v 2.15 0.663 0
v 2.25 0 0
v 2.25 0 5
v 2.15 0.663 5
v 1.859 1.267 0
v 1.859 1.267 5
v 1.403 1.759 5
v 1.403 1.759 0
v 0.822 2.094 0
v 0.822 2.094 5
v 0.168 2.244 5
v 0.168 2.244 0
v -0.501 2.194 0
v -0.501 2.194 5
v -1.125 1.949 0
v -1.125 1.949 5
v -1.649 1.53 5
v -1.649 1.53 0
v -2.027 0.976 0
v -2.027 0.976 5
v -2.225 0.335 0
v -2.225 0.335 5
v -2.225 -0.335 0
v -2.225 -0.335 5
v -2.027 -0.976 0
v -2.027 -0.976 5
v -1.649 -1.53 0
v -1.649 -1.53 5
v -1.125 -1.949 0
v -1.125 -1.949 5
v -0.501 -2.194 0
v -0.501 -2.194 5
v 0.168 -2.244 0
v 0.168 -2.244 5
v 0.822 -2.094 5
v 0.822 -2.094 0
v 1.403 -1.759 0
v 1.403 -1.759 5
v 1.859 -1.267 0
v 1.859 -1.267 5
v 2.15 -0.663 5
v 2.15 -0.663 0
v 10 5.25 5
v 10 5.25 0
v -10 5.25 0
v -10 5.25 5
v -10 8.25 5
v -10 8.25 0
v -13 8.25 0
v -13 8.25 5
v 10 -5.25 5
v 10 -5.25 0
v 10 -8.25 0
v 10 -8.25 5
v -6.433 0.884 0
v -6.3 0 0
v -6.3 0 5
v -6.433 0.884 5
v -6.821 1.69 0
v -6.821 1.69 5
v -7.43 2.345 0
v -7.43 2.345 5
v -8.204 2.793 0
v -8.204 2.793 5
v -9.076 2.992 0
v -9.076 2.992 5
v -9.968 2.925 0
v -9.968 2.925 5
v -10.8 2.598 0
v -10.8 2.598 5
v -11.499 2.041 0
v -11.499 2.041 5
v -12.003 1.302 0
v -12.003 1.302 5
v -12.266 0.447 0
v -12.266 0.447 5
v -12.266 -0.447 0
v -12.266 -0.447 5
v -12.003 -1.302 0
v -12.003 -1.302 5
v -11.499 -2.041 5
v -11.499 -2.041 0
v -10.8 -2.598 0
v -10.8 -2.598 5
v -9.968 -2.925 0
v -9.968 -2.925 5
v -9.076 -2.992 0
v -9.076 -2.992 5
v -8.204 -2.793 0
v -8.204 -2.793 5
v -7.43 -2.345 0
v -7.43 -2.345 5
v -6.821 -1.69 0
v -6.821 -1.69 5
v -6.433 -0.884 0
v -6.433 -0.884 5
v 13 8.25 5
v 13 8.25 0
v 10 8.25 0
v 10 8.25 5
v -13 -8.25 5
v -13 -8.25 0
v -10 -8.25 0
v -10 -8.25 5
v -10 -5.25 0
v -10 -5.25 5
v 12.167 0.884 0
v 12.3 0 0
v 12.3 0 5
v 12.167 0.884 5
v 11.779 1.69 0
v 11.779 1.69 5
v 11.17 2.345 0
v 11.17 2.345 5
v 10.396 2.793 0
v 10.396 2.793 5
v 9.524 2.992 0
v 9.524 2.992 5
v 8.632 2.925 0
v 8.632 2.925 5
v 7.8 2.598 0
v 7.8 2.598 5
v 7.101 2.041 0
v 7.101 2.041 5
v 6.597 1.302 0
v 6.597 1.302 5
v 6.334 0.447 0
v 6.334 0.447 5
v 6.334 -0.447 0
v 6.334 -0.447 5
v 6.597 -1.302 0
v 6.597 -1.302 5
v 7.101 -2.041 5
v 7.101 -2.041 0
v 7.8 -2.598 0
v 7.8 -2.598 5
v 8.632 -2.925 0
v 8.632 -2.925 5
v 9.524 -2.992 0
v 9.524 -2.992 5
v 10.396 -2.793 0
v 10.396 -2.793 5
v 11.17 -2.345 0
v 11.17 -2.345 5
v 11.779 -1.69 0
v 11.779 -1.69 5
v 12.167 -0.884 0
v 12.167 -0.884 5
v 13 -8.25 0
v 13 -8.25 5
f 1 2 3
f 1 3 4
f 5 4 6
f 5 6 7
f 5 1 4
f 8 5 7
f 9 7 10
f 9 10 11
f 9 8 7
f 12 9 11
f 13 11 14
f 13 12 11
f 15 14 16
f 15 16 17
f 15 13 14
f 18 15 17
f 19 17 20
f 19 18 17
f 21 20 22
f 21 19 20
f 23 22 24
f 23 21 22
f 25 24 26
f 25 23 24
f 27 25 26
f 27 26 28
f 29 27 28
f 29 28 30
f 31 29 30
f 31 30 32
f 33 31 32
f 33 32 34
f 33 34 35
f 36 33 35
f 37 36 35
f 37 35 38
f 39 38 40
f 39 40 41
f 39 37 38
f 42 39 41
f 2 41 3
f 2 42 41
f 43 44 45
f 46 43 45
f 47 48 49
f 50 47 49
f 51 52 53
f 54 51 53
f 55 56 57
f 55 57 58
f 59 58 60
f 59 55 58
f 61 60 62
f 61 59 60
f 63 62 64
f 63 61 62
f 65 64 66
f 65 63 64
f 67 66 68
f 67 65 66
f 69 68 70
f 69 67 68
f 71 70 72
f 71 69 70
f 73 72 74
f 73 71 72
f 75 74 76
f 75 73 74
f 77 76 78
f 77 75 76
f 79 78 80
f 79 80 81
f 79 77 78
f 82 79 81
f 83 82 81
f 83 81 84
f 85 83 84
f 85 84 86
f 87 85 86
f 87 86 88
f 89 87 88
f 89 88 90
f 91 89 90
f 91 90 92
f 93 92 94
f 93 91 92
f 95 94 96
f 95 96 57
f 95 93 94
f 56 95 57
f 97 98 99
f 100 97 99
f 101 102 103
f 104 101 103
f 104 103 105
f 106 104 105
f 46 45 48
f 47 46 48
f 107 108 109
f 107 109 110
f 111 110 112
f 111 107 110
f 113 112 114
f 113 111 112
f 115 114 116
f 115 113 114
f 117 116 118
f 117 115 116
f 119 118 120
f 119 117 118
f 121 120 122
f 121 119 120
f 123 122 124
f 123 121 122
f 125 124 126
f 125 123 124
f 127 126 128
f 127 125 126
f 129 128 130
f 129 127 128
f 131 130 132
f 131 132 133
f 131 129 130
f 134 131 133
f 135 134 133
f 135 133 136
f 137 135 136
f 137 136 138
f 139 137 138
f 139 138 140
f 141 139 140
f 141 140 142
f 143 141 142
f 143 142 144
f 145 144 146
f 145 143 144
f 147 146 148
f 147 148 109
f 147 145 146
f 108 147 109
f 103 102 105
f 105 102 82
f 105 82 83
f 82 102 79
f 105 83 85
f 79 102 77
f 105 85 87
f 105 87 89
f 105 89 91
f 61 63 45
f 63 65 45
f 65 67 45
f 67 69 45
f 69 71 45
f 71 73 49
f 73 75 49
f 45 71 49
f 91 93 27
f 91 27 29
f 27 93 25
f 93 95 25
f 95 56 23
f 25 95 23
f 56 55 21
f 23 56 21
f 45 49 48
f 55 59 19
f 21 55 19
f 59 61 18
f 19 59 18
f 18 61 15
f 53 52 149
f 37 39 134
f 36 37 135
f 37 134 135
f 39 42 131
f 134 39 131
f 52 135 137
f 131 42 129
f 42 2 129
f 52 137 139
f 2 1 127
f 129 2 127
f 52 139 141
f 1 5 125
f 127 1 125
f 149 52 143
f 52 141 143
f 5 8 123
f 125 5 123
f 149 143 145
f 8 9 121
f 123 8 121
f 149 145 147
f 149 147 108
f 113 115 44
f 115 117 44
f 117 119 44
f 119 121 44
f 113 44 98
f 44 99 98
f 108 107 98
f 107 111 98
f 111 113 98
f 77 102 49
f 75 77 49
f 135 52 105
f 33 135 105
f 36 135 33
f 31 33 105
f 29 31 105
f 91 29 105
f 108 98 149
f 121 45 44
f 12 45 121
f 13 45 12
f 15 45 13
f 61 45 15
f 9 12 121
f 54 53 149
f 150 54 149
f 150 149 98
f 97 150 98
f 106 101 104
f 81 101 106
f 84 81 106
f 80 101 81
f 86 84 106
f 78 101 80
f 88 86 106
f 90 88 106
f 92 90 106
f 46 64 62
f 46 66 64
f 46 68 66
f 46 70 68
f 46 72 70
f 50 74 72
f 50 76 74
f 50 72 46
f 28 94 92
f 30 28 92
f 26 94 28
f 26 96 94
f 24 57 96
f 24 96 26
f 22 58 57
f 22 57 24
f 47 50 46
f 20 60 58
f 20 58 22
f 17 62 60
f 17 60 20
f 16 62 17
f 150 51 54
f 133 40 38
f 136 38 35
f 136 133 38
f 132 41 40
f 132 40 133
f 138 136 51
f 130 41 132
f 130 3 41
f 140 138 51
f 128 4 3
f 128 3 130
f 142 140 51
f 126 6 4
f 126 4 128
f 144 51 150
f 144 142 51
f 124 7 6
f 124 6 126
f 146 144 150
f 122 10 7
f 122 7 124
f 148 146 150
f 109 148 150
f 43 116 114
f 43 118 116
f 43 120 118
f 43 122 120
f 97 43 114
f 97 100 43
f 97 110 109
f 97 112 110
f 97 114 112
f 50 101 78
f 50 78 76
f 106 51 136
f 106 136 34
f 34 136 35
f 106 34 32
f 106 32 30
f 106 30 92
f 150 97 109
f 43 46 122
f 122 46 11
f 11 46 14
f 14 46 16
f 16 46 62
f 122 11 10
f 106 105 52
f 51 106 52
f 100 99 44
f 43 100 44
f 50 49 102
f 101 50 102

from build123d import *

# Parameters (mm, degrees)
SKETCH1_R           = 3
SKETCH1_R_2         = 2.25
BOSS_EXTRUDE1_DEPTH = 5


with BuildPart() as part:
    # Sketch1 → Boss-Extrude1 (new body)
    with BuildSketch(Plane.XY):
        Polygon((-13, 8.25), (-13, -8.25), (-10, -8.25), (-10, -5.25), (10, -5.25), (10, -8.25), (13, -8.25), (13, 8.25), (10, 8.25), (10, 5.25), (-10, 5.25), (-10, 8.25), align=None)
        with Locations((-9.3, 0)):
            Circle(SKETCH1_R, mode=Mode.SUBTRACT)
        Circle(SKETCH1_R_2, mode=Mode.SUBTRACT)
        with Locations((9.3, 0)):
            Circle(SKETCH1_R, mode=Mode.SUBTRACT)
    extrude(amount=BOSS_EXTRUDE1_DEPTH)


solid = part.part
